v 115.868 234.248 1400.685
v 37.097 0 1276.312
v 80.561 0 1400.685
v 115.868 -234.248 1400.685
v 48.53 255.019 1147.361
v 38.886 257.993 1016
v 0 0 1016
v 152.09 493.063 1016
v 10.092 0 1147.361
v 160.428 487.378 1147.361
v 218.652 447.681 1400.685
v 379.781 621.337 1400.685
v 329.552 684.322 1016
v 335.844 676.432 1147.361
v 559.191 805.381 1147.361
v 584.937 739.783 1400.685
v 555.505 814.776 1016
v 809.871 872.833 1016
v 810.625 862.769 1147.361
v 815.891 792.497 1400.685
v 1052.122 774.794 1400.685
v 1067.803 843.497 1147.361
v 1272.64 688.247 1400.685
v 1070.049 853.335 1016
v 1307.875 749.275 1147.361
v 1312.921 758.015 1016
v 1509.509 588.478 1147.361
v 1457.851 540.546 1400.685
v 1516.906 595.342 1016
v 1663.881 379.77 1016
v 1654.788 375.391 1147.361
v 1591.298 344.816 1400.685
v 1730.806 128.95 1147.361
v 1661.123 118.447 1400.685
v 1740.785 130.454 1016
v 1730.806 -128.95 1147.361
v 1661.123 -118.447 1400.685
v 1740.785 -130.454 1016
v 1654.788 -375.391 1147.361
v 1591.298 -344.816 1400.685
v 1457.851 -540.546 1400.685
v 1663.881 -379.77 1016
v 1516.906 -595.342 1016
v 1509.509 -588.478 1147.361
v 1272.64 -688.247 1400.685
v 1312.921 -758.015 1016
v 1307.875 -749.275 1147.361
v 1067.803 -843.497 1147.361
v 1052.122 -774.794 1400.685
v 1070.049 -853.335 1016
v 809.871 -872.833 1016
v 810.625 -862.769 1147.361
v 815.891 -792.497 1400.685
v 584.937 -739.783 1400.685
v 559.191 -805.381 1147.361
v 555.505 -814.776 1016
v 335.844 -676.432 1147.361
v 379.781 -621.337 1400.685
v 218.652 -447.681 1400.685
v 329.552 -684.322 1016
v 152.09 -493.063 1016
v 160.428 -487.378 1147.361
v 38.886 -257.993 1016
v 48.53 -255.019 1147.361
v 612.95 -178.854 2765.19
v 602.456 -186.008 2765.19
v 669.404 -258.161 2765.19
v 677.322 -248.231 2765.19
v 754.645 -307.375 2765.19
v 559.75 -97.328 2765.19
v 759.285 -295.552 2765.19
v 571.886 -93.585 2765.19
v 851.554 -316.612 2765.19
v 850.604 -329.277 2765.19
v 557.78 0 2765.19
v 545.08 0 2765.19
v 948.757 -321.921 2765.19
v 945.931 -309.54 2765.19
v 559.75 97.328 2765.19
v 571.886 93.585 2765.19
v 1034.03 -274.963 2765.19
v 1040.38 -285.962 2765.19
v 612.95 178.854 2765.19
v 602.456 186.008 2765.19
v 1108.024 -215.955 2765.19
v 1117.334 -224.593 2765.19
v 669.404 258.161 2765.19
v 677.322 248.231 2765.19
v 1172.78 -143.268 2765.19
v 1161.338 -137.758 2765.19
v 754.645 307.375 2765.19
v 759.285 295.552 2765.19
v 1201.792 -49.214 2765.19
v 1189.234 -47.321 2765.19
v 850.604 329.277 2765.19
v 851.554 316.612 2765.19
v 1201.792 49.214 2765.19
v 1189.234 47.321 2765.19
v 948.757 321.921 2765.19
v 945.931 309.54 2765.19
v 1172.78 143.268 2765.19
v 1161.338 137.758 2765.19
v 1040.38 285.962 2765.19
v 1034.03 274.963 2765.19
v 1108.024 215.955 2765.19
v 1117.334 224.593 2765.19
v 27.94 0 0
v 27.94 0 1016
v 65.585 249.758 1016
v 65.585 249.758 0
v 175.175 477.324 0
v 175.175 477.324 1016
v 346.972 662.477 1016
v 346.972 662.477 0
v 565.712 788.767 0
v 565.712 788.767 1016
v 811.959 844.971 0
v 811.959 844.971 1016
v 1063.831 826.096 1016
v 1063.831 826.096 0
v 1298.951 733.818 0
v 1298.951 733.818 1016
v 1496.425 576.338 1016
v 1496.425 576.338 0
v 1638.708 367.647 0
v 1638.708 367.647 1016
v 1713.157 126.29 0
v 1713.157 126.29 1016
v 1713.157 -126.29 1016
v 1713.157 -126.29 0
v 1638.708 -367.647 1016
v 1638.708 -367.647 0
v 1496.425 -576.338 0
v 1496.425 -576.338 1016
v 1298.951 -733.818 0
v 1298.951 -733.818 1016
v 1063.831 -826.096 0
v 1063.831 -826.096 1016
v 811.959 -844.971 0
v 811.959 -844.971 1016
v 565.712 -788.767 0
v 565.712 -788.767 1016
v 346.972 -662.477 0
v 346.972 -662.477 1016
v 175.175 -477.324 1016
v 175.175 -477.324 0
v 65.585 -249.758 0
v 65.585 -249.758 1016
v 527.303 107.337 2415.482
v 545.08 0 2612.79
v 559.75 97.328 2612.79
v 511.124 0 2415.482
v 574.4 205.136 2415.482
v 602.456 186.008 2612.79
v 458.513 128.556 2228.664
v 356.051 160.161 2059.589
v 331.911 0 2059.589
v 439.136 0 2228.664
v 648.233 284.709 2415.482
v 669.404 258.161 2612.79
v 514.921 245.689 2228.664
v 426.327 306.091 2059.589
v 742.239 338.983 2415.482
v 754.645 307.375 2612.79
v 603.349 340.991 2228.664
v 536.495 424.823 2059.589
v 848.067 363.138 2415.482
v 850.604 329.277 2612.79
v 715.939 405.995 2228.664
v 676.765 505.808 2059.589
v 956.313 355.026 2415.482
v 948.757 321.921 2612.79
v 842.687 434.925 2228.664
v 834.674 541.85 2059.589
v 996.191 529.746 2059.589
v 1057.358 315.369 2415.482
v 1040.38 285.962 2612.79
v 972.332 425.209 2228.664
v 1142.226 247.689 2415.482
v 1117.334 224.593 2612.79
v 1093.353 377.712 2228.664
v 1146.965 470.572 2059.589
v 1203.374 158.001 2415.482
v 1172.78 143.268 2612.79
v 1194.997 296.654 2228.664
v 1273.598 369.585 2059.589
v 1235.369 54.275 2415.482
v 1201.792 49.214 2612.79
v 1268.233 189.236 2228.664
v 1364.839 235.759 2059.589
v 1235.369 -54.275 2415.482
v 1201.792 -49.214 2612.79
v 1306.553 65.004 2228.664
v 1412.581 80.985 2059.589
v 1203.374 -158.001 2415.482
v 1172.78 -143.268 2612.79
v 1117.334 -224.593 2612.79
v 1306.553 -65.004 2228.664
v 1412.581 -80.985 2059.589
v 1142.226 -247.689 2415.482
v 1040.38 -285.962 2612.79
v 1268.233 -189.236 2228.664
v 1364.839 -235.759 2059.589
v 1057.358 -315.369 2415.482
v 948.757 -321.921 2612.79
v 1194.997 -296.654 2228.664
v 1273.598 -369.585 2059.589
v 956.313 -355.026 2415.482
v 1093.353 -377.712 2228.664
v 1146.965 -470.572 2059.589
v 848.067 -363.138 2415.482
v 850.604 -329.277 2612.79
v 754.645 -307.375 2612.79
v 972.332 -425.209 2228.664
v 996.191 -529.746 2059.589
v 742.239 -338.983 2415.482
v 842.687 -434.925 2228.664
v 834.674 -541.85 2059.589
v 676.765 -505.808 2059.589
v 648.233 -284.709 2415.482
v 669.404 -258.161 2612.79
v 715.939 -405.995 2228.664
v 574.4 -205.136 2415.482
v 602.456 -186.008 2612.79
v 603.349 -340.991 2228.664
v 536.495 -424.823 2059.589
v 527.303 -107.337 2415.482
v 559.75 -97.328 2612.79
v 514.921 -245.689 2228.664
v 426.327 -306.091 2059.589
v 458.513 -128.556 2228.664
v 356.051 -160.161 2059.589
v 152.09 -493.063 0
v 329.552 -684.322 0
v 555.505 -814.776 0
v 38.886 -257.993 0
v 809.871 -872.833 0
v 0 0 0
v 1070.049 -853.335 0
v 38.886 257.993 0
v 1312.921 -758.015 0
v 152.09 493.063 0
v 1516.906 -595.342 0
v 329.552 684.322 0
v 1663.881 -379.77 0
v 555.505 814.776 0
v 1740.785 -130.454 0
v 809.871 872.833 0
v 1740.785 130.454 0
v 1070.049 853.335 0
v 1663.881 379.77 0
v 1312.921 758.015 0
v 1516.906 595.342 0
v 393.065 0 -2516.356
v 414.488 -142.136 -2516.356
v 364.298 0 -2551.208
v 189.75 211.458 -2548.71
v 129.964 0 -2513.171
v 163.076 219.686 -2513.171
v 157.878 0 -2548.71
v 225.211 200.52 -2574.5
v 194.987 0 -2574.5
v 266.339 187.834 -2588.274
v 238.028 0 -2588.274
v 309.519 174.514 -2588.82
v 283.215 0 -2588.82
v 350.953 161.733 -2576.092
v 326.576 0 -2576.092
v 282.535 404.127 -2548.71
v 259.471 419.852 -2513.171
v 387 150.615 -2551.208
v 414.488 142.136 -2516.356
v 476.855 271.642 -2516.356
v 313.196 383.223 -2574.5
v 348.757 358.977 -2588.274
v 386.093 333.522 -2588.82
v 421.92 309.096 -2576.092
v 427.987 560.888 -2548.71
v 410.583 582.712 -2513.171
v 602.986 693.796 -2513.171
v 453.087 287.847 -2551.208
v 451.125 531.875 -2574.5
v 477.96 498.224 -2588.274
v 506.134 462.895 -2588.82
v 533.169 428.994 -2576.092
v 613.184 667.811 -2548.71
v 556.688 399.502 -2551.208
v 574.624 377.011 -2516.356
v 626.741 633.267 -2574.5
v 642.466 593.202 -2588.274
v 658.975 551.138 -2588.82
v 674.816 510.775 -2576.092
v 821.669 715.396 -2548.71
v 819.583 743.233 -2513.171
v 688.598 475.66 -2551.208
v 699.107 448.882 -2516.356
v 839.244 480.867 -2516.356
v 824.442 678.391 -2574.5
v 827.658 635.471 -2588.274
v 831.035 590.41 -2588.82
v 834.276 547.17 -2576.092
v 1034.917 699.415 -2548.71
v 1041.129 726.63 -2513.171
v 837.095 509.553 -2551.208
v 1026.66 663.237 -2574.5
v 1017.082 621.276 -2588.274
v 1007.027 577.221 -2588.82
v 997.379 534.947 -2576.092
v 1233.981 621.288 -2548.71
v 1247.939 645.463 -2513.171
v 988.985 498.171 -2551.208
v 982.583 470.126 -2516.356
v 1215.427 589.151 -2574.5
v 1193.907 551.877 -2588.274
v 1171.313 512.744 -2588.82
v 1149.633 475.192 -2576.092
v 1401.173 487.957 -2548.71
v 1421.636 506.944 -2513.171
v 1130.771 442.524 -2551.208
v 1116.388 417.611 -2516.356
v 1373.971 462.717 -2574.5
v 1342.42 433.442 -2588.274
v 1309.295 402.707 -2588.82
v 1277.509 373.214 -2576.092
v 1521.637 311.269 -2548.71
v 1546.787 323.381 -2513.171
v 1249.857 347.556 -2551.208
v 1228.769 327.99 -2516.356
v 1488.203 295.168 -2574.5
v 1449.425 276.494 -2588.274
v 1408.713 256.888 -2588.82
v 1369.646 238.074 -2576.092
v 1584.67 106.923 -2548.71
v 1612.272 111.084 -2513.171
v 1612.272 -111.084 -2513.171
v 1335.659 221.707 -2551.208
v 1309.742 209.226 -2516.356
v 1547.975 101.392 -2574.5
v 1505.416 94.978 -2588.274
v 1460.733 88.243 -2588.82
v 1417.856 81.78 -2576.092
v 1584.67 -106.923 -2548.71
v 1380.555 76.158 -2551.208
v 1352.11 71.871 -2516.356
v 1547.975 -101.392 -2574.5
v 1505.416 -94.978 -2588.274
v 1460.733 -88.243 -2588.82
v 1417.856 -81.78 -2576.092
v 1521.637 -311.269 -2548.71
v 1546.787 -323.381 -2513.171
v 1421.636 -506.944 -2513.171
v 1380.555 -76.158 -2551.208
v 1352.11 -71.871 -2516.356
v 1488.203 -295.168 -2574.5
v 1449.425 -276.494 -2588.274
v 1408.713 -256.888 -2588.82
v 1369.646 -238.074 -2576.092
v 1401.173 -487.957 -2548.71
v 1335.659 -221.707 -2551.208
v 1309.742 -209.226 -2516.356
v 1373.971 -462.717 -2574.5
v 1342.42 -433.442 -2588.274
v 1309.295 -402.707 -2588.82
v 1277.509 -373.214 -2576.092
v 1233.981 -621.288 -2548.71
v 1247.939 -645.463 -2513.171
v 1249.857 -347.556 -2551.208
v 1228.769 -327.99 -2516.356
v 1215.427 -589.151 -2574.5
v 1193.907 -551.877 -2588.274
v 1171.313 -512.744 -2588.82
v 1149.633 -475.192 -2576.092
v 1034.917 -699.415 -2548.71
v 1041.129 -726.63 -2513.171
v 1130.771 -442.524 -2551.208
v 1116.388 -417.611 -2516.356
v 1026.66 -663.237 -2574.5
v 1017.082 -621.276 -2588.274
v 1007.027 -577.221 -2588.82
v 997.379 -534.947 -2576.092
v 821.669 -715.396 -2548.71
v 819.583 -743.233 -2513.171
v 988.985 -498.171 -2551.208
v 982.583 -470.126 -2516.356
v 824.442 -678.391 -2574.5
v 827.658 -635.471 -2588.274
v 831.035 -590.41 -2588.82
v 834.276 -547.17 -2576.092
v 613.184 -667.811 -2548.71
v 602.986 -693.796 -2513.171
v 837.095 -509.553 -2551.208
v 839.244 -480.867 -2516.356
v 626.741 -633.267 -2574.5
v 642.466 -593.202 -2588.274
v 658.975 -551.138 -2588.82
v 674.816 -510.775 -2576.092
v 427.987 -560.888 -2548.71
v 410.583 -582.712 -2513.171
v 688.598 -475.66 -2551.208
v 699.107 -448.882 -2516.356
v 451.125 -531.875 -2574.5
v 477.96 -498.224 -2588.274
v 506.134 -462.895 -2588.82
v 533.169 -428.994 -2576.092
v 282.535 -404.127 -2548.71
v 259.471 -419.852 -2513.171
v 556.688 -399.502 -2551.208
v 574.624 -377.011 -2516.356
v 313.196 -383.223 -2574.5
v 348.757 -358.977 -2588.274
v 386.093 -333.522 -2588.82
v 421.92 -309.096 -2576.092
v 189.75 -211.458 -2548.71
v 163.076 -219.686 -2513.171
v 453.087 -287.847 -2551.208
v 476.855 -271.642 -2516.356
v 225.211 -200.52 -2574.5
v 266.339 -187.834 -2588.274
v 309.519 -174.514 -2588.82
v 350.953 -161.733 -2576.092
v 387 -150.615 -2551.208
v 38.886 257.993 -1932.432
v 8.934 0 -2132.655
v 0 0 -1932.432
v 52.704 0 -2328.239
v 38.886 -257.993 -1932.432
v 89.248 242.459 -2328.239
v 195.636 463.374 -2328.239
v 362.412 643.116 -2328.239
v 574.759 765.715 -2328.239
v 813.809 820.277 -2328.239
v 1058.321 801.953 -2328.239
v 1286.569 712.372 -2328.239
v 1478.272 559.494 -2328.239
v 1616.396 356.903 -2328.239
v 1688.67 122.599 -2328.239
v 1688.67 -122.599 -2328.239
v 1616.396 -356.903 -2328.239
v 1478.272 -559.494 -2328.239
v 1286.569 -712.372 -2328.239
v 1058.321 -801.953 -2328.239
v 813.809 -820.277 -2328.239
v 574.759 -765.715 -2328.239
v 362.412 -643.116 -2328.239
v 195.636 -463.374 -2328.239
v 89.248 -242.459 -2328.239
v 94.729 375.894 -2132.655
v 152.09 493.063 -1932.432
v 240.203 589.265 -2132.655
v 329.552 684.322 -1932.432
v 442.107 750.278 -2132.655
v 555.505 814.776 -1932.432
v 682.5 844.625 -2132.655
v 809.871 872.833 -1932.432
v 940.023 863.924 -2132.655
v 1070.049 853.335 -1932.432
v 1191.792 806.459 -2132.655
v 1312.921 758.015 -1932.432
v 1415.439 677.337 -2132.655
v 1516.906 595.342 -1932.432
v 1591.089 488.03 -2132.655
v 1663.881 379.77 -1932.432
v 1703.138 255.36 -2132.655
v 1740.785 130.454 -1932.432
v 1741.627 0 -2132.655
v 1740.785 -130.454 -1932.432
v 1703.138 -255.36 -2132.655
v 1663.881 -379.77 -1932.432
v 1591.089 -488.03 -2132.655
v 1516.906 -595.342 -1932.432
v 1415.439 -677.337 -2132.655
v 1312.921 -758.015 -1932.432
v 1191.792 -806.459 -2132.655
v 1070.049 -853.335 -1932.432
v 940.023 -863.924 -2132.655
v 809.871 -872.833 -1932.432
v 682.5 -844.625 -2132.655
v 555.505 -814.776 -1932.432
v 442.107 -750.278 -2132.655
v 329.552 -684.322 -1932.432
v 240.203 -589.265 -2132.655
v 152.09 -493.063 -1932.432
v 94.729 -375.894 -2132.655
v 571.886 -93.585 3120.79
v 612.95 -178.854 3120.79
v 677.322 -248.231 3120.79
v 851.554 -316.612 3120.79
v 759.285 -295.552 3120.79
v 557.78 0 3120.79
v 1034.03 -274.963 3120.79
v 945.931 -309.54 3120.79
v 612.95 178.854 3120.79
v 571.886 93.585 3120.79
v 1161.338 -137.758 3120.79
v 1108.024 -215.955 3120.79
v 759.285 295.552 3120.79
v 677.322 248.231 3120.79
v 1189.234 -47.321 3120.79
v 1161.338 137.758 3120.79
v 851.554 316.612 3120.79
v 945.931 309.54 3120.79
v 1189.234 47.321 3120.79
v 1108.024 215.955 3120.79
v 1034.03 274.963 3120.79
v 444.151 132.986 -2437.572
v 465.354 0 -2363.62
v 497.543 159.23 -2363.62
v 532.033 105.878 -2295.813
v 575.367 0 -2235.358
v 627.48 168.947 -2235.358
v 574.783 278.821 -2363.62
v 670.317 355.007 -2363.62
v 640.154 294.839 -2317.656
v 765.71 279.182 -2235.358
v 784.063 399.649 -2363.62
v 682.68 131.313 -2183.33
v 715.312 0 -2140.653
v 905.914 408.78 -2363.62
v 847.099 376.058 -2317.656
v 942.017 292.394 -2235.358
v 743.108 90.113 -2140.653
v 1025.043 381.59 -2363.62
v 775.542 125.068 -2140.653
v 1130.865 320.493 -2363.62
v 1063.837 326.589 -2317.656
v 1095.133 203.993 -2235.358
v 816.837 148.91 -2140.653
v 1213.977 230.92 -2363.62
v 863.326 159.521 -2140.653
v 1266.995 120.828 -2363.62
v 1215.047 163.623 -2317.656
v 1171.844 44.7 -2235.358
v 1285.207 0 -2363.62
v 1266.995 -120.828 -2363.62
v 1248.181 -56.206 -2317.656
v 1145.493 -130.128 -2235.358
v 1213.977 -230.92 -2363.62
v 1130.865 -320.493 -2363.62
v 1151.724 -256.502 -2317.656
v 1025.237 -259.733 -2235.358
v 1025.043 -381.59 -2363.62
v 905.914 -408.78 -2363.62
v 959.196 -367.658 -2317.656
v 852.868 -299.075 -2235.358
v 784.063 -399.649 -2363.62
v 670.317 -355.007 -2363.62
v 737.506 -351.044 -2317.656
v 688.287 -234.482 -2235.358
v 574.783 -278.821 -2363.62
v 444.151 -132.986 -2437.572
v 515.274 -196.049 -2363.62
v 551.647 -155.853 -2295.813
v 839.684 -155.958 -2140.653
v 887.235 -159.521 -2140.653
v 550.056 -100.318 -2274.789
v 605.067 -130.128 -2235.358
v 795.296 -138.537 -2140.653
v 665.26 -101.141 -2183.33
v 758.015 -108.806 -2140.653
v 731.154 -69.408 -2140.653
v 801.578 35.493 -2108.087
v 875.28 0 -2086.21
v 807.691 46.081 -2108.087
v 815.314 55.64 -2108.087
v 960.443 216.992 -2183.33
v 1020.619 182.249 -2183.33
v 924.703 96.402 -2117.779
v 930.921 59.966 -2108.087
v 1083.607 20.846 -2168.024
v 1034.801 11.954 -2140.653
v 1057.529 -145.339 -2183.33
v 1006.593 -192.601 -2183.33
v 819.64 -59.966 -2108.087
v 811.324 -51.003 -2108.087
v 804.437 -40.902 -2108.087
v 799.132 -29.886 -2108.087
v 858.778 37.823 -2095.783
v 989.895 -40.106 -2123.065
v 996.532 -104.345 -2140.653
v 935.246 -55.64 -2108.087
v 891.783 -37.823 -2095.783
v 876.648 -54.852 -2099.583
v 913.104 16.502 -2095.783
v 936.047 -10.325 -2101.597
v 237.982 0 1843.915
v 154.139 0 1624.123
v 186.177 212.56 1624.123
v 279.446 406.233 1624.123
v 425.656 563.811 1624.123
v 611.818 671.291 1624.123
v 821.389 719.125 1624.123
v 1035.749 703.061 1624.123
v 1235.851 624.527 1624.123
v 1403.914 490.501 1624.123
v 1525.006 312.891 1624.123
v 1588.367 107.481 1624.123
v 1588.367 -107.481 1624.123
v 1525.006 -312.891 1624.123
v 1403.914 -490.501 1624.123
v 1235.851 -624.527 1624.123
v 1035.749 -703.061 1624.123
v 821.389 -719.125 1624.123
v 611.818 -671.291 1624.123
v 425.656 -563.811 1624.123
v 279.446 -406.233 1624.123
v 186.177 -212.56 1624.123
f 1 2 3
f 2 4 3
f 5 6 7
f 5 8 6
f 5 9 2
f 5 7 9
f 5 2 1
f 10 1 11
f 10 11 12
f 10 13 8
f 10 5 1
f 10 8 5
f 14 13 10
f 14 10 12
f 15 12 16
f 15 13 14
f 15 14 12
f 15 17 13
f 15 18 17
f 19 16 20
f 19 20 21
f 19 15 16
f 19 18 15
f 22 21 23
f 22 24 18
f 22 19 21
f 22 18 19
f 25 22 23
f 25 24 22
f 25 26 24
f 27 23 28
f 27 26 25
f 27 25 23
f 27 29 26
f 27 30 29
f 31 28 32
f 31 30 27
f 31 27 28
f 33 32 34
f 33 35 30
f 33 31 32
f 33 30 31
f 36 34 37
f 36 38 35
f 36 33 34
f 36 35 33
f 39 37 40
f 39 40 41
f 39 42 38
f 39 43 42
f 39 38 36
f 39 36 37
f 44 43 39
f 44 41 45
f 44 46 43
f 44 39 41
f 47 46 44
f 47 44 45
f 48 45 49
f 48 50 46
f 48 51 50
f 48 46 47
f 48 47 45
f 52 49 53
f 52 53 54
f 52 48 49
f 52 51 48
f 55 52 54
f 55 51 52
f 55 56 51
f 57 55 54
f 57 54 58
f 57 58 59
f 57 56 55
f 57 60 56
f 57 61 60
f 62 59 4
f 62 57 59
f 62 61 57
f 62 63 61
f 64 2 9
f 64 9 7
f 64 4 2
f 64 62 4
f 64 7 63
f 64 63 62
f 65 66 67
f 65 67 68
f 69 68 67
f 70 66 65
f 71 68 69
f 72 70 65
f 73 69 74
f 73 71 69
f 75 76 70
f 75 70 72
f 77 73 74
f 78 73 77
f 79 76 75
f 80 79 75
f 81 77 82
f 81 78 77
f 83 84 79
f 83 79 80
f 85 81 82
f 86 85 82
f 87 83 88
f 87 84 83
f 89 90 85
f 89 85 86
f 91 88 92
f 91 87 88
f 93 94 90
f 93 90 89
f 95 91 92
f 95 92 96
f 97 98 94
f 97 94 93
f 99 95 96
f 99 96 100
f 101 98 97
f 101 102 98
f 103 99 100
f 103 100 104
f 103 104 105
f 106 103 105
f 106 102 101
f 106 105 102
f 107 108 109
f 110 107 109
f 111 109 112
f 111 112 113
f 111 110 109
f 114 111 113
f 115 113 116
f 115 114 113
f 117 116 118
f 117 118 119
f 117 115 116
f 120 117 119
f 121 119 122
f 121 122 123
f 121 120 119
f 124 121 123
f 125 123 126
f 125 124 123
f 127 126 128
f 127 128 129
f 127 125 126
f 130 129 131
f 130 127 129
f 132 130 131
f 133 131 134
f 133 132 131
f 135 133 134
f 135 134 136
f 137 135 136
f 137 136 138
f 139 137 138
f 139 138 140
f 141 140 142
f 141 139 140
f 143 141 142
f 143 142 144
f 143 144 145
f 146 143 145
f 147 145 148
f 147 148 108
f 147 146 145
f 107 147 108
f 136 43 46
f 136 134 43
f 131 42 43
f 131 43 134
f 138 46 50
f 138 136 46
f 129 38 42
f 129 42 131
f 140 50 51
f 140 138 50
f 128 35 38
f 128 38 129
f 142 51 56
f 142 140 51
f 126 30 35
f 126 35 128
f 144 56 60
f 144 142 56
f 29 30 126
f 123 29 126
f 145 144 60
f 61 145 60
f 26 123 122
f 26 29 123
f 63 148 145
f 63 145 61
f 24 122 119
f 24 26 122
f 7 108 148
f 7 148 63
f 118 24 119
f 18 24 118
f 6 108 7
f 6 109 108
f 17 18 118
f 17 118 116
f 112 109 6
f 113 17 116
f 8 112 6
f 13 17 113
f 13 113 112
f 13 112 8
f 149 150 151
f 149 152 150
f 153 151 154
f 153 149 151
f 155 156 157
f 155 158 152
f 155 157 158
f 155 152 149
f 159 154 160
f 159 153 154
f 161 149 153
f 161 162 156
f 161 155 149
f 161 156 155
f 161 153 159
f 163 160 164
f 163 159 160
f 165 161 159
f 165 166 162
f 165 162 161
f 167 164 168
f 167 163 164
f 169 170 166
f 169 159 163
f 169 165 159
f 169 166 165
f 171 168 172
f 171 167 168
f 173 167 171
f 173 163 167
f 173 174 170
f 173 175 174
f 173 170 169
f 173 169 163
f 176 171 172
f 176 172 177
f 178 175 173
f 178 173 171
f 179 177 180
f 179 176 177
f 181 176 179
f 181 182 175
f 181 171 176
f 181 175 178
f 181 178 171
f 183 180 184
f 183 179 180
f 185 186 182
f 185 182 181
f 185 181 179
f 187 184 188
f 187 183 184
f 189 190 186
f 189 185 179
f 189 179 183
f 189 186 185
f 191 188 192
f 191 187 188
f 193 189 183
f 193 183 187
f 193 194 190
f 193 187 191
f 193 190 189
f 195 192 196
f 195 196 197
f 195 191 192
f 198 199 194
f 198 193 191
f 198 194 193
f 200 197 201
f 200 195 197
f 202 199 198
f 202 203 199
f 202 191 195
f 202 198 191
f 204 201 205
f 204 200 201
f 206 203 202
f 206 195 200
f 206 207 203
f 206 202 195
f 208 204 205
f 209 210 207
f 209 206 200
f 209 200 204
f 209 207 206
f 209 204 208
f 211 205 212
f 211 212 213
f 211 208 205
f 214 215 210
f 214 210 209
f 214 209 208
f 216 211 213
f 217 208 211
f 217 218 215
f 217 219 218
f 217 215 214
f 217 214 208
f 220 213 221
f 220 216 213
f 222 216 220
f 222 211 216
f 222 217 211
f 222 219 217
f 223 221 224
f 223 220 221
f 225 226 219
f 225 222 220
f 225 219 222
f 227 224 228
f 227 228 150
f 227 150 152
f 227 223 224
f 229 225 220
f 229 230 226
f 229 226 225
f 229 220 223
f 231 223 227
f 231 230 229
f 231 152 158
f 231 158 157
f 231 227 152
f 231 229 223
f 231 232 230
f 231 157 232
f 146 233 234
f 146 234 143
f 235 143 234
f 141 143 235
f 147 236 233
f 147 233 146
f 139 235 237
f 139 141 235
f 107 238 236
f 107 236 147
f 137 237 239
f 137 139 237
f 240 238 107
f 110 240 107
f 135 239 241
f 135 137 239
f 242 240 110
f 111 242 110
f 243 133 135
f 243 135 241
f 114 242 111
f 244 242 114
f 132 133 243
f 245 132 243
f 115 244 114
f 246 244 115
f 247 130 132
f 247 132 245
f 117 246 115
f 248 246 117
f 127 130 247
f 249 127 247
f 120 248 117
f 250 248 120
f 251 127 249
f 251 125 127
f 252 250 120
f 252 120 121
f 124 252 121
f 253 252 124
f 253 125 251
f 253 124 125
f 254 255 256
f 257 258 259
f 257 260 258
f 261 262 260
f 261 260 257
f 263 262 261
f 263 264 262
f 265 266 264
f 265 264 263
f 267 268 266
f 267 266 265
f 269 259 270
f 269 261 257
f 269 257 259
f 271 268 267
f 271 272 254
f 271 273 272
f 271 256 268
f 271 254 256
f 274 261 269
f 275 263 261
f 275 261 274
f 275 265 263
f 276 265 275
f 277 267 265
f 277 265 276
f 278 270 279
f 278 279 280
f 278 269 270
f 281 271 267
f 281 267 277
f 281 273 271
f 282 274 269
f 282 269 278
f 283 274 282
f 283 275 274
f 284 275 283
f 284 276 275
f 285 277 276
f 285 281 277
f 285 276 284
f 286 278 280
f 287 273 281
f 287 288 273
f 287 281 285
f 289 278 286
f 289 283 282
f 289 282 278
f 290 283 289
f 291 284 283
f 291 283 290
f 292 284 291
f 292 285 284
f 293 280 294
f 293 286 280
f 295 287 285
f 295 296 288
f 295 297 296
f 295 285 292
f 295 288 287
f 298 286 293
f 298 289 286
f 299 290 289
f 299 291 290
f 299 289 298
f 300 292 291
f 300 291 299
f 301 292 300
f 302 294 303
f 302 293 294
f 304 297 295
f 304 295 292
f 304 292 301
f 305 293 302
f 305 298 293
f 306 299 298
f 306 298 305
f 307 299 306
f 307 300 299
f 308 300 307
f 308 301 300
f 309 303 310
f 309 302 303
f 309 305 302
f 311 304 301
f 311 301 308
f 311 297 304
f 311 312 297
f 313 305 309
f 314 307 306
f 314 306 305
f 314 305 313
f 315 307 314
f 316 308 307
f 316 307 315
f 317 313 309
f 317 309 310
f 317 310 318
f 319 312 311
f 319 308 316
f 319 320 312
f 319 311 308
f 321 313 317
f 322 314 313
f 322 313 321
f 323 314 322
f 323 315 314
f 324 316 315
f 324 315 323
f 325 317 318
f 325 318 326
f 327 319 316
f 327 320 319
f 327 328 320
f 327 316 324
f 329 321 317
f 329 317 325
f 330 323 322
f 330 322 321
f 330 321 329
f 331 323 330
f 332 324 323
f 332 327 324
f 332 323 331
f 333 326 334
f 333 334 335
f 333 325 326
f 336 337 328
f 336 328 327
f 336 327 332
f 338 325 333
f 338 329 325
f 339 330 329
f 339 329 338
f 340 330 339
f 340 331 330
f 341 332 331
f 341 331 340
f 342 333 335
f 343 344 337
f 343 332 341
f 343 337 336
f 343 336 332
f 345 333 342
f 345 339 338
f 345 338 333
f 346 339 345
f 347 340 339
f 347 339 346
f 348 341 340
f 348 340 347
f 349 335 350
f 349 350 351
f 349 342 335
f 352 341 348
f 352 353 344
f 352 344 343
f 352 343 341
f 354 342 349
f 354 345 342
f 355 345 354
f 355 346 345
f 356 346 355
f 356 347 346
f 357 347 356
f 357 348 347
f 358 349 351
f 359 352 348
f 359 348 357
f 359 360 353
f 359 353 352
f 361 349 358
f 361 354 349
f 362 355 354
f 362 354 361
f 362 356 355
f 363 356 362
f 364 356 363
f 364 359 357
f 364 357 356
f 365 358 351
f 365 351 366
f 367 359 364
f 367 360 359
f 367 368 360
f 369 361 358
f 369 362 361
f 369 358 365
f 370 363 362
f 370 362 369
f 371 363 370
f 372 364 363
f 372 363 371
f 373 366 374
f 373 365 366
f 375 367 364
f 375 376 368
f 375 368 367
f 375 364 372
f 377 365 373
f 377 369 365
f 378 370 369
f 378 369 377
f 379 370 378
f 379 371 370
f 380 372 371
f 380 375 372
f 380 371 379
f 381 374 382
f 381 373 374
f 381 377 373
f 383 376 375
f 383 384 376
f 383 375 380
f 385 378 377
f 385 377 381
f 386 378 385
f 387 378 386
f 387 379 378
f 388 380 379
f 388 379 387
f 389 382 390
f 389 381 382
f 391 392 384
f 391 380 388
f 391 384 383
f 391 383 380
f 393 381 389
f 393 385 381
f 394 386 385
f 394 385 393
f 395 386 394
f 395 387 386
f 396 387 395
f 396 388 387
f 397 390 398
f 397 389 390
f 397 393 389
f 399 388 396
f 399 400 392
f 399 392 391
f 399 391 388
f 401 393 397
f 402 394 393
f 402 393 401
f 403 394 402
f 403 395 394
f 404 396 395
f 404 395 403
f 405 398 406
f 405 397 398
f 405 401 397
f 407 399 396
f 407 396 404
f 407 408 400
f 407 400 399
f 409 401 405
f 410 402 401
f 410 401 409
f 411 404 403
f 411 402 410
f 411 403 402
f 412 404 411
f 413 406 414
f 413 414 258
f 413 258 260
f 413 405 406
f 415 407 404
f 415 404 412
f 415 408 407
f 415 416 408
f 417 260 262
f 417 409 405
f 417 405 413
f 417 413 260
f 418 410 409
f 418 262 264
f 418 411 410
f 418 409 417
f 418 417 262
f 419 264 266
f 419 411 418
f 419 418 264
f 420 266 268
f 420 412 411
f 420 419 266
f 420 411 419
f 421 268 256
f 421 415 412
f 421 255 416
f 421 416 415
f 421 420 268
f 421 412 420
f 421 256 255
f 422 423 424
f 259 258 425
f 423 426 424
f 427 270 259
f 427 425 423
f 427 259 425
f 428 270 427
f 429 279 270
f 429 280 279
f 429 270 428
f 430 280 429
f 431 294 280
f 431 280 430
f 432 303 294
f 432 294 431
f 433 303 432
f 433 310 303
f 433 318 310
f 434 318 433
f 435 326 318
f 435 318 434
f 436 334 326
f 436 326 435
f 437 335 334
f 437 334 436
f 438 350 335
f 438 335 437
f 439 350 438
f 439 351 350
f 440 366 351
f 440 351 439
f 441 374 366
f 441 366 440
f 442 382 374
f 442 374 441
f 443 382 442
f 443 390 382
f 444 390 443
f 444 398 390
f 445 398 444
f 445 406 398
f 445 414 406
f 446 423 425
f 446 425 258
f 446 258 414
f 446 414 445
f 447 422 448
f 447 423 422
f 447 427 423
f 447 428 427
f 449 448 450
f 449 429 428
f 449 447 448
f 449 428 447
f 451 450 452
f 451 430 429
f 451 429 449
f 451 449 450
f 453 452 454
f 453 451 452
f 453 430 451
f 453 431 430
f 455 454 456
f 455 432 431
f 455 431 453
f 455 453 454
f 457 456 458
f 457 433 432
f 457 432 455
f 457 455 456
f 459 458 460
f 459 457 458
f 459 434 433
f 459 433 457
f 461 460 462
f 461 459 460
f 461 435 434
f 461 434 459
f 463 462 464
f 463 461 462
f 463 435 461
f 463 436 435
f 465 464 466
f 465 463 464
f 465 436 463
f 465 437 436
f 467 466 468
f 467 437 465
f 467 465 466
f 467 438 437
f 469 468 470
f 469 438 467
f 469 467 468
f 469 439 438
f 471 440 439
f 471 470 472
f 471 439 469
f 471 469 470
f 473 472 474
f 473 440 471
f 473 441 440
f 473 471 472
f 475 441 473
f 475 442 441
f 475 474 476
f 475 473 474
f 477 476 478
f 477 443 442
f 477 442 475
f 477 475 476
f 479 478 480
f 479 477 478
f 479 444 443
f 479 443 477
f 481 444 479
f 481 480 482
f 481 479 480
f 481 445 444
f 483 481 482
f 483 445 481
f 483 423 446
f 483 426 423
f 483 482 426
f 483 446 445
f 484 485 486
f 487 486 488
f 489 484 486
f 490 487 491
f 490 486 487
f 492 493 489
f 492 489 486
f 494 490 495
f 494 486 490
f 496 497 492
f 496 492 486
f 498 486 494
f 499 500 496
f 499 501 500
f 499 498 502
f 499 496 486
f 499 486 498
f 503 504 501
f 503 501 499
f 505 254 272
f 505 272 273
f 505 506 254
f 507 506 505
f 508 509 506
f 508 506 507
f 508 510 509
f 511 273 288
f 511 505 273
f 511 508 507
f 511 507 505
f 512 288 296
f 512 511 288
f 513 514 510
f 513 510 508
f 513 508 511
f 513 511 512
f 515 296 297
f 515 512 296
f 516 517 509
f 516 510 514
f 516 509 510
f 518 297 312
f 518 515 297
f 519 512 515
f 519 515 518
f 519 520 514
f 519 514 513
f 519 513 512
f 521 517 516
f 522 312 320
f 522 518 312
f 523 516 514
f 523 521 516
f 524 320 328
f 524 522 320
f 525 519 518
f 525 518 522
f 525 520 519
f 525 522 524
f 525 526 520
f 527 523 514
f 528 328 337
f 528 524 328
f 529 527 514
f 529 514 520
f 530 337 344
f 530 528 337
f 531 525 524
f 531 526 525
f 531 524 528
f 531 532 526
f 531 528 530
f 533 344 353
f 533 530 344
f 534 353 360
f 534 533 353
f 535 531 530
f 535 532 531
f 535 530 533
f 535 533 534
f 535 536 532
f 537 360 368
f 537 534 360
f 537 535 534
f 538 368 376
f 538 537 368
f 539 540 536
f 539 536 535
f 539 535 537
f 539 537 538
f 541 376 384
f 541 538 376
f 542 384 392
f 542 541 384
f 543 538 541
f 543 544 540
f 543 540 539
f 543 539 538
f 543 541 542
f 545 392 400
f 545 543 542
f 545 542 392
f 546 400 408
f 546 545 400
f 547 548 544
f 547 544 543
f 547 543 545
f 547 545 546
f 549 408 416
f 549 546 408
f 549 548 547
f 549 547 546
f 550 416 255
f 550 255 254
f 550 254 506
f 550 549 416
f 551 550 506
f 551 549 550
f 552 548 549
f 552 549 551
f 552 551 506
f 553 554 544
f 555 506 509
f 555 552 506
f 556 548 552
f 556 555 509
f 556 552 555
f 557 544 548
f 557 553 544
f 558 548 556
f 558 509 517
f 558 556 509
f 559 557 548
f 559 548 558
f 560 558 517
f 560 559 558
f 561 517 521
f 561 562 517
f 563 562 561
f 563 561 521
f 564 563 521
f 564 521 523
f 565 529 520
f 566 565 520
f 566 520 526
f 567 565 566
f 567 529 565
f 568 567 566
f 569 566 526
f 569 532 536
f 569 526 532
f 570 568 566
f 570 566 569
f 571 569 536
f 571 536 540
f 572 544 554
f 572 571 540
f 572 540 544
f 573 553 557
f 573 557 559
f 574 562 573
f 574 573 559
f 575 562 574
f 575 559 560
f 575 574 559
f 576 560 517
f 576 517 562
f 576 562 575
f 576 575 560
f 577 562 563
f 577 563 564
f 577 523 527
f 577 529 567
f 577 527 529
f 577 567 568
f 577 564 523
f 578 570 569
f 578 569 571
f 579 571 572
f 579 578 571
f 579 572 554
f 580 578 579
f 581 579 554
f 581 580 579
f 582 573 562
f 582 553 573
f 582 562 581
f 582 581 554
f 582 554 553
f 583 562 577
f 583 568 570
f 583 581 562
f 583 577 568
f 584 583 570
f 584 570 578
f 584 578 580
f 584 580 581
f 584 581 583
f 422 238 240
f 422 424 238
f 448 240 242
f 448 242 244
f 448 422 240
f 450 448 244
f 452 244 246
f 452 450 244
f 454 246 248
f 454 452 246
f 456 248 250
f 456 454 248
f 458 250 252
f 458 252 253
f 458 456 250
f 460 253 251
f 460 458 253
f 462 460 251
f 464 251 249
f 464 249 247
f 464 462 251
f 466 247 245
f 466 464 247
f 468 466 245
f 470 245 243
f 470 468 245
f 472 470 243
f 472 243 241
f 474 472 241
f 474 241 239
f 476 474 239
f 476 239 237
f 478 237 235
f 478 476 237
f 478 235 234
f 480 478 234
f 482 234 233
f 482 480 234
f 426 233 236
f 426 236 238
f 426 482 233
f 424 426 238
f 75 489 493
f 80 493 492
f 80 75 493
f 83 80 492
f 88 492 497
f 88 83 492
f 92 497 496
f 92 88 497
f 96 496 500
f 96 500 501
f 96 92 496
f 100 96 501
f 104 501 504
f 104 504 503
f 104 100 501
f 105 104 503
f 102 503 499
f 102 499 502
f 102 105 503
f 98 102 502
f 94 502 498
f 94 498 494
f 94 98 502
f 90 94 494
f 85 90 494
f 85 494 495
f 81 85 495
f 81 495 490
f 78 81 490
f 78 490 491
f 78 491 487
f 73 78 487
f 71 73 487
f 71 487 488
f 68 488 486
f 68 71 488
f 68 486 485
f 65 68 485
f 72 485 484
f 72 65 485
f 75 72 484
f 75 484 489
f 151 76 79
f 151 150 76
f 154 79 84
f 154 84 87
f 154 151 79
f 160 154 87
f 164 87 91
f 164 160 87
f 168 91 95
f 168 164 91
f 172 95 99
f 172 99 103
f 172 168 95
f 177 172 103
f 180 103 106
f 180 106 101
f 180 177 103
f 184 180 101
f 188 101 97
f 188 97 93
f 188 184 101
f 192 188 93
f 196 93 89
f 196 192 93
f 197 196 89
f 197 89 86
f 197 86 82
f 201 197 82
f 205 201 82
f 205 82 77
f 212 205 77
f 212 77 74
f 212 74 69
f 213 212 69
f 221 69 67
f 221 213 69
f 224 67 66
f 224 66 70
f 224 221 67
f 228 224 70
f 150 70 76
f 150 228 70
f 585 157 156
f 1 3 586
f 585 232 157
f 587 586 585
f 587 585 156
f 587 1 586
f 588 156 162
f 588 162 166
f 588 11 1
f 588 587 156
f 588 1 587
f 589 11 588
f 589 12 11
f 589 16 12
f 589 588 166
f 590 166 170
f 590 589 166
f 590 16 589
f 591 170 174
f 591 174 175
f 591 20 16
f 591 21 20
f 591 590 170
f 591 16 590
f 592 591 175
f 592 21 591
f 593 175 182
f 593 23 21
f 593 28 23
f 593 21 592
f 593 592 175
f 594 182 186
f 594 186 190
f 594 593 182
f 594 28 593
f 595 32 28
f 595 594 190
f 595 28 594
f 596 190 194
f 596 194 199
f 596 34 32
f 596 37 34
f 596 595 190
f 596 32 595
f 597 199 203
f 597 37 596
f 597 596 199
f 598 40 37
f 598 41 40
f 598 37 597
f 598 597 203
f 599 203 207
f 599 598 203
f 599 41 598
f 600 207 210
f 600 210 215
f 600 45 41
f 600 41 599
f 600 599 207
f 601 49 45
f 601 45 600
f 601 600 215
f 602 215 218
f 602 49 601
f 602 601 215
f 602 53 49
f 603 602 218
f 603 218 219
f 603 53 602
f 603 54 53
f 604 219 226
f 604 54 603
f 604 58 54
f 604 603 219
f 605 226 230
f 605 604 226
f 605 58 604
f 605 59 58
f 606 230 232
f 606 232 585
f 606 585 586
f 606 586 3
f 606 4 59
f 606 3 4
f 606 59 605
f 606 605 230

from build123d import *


with BuildPart() as f1:
    # F0 (on Front) → F1 (revolve)
    with BuildSketch(Plane.XZ):
        with BuildLine():
            Line((27.94, 0), (0, 0))
            Line((0, 0), (0, -1932.432))
            ThreePointArc((0, -1932.432), (26.5235814991, -2231.4081992011), (129.9637542715, -2513.1712179261))
            ThreePointArc((129.9637542715, -2513.1712179261), (260.6008175566, -2590.2312181989), (393.064647913, -2516.3555145264))
            ThreePointArc((393.064647913, -2516.3555145264), (575.3665753234, -2235.3582656075), (875.2803637505, -2086.2101306915))
            Line((875.2803637505, -2086.2101306915), (875.2803637505, 3120.7898693085))
            Line((875.2803637505, 3120.7898693085), (557.7803637505, 3120.7898693085))
            Line((557.7803637505, 3120.7898693085), (557.7803637505, 2765.1898693085))
            Line((557.7803637505, 2765.1898693085), (545.0803637505, 2765.1898693085))
            Line((545.0803637505, 2765.1898693085), (545.0803637505, 2612.7898693085))
            ThreePointArc((545.0803637505, 2612.7898693085), (479.7429476859, 2320.2954283546), (331.9108282475, 2059.5893862512))
            ThreePointArc((331.9108282475, 2059.5893862512), (194.7883198217, 1734.5039966945), (80.561093986, 1400.6848335266))
            ThreePointArc((80.561093986, 1400.6848335266), (21.5017804993, 1212.2750853808), (0, 1016))
            Line((0, 1016), (27.94, 1016))
            Line((27.94, 1016), (27.94, 0))
        make_face()
    revolve(axis=Axis((875.2803637505, 0, 517.2898693085), (0, 0, -1)))


solid = f1.part
